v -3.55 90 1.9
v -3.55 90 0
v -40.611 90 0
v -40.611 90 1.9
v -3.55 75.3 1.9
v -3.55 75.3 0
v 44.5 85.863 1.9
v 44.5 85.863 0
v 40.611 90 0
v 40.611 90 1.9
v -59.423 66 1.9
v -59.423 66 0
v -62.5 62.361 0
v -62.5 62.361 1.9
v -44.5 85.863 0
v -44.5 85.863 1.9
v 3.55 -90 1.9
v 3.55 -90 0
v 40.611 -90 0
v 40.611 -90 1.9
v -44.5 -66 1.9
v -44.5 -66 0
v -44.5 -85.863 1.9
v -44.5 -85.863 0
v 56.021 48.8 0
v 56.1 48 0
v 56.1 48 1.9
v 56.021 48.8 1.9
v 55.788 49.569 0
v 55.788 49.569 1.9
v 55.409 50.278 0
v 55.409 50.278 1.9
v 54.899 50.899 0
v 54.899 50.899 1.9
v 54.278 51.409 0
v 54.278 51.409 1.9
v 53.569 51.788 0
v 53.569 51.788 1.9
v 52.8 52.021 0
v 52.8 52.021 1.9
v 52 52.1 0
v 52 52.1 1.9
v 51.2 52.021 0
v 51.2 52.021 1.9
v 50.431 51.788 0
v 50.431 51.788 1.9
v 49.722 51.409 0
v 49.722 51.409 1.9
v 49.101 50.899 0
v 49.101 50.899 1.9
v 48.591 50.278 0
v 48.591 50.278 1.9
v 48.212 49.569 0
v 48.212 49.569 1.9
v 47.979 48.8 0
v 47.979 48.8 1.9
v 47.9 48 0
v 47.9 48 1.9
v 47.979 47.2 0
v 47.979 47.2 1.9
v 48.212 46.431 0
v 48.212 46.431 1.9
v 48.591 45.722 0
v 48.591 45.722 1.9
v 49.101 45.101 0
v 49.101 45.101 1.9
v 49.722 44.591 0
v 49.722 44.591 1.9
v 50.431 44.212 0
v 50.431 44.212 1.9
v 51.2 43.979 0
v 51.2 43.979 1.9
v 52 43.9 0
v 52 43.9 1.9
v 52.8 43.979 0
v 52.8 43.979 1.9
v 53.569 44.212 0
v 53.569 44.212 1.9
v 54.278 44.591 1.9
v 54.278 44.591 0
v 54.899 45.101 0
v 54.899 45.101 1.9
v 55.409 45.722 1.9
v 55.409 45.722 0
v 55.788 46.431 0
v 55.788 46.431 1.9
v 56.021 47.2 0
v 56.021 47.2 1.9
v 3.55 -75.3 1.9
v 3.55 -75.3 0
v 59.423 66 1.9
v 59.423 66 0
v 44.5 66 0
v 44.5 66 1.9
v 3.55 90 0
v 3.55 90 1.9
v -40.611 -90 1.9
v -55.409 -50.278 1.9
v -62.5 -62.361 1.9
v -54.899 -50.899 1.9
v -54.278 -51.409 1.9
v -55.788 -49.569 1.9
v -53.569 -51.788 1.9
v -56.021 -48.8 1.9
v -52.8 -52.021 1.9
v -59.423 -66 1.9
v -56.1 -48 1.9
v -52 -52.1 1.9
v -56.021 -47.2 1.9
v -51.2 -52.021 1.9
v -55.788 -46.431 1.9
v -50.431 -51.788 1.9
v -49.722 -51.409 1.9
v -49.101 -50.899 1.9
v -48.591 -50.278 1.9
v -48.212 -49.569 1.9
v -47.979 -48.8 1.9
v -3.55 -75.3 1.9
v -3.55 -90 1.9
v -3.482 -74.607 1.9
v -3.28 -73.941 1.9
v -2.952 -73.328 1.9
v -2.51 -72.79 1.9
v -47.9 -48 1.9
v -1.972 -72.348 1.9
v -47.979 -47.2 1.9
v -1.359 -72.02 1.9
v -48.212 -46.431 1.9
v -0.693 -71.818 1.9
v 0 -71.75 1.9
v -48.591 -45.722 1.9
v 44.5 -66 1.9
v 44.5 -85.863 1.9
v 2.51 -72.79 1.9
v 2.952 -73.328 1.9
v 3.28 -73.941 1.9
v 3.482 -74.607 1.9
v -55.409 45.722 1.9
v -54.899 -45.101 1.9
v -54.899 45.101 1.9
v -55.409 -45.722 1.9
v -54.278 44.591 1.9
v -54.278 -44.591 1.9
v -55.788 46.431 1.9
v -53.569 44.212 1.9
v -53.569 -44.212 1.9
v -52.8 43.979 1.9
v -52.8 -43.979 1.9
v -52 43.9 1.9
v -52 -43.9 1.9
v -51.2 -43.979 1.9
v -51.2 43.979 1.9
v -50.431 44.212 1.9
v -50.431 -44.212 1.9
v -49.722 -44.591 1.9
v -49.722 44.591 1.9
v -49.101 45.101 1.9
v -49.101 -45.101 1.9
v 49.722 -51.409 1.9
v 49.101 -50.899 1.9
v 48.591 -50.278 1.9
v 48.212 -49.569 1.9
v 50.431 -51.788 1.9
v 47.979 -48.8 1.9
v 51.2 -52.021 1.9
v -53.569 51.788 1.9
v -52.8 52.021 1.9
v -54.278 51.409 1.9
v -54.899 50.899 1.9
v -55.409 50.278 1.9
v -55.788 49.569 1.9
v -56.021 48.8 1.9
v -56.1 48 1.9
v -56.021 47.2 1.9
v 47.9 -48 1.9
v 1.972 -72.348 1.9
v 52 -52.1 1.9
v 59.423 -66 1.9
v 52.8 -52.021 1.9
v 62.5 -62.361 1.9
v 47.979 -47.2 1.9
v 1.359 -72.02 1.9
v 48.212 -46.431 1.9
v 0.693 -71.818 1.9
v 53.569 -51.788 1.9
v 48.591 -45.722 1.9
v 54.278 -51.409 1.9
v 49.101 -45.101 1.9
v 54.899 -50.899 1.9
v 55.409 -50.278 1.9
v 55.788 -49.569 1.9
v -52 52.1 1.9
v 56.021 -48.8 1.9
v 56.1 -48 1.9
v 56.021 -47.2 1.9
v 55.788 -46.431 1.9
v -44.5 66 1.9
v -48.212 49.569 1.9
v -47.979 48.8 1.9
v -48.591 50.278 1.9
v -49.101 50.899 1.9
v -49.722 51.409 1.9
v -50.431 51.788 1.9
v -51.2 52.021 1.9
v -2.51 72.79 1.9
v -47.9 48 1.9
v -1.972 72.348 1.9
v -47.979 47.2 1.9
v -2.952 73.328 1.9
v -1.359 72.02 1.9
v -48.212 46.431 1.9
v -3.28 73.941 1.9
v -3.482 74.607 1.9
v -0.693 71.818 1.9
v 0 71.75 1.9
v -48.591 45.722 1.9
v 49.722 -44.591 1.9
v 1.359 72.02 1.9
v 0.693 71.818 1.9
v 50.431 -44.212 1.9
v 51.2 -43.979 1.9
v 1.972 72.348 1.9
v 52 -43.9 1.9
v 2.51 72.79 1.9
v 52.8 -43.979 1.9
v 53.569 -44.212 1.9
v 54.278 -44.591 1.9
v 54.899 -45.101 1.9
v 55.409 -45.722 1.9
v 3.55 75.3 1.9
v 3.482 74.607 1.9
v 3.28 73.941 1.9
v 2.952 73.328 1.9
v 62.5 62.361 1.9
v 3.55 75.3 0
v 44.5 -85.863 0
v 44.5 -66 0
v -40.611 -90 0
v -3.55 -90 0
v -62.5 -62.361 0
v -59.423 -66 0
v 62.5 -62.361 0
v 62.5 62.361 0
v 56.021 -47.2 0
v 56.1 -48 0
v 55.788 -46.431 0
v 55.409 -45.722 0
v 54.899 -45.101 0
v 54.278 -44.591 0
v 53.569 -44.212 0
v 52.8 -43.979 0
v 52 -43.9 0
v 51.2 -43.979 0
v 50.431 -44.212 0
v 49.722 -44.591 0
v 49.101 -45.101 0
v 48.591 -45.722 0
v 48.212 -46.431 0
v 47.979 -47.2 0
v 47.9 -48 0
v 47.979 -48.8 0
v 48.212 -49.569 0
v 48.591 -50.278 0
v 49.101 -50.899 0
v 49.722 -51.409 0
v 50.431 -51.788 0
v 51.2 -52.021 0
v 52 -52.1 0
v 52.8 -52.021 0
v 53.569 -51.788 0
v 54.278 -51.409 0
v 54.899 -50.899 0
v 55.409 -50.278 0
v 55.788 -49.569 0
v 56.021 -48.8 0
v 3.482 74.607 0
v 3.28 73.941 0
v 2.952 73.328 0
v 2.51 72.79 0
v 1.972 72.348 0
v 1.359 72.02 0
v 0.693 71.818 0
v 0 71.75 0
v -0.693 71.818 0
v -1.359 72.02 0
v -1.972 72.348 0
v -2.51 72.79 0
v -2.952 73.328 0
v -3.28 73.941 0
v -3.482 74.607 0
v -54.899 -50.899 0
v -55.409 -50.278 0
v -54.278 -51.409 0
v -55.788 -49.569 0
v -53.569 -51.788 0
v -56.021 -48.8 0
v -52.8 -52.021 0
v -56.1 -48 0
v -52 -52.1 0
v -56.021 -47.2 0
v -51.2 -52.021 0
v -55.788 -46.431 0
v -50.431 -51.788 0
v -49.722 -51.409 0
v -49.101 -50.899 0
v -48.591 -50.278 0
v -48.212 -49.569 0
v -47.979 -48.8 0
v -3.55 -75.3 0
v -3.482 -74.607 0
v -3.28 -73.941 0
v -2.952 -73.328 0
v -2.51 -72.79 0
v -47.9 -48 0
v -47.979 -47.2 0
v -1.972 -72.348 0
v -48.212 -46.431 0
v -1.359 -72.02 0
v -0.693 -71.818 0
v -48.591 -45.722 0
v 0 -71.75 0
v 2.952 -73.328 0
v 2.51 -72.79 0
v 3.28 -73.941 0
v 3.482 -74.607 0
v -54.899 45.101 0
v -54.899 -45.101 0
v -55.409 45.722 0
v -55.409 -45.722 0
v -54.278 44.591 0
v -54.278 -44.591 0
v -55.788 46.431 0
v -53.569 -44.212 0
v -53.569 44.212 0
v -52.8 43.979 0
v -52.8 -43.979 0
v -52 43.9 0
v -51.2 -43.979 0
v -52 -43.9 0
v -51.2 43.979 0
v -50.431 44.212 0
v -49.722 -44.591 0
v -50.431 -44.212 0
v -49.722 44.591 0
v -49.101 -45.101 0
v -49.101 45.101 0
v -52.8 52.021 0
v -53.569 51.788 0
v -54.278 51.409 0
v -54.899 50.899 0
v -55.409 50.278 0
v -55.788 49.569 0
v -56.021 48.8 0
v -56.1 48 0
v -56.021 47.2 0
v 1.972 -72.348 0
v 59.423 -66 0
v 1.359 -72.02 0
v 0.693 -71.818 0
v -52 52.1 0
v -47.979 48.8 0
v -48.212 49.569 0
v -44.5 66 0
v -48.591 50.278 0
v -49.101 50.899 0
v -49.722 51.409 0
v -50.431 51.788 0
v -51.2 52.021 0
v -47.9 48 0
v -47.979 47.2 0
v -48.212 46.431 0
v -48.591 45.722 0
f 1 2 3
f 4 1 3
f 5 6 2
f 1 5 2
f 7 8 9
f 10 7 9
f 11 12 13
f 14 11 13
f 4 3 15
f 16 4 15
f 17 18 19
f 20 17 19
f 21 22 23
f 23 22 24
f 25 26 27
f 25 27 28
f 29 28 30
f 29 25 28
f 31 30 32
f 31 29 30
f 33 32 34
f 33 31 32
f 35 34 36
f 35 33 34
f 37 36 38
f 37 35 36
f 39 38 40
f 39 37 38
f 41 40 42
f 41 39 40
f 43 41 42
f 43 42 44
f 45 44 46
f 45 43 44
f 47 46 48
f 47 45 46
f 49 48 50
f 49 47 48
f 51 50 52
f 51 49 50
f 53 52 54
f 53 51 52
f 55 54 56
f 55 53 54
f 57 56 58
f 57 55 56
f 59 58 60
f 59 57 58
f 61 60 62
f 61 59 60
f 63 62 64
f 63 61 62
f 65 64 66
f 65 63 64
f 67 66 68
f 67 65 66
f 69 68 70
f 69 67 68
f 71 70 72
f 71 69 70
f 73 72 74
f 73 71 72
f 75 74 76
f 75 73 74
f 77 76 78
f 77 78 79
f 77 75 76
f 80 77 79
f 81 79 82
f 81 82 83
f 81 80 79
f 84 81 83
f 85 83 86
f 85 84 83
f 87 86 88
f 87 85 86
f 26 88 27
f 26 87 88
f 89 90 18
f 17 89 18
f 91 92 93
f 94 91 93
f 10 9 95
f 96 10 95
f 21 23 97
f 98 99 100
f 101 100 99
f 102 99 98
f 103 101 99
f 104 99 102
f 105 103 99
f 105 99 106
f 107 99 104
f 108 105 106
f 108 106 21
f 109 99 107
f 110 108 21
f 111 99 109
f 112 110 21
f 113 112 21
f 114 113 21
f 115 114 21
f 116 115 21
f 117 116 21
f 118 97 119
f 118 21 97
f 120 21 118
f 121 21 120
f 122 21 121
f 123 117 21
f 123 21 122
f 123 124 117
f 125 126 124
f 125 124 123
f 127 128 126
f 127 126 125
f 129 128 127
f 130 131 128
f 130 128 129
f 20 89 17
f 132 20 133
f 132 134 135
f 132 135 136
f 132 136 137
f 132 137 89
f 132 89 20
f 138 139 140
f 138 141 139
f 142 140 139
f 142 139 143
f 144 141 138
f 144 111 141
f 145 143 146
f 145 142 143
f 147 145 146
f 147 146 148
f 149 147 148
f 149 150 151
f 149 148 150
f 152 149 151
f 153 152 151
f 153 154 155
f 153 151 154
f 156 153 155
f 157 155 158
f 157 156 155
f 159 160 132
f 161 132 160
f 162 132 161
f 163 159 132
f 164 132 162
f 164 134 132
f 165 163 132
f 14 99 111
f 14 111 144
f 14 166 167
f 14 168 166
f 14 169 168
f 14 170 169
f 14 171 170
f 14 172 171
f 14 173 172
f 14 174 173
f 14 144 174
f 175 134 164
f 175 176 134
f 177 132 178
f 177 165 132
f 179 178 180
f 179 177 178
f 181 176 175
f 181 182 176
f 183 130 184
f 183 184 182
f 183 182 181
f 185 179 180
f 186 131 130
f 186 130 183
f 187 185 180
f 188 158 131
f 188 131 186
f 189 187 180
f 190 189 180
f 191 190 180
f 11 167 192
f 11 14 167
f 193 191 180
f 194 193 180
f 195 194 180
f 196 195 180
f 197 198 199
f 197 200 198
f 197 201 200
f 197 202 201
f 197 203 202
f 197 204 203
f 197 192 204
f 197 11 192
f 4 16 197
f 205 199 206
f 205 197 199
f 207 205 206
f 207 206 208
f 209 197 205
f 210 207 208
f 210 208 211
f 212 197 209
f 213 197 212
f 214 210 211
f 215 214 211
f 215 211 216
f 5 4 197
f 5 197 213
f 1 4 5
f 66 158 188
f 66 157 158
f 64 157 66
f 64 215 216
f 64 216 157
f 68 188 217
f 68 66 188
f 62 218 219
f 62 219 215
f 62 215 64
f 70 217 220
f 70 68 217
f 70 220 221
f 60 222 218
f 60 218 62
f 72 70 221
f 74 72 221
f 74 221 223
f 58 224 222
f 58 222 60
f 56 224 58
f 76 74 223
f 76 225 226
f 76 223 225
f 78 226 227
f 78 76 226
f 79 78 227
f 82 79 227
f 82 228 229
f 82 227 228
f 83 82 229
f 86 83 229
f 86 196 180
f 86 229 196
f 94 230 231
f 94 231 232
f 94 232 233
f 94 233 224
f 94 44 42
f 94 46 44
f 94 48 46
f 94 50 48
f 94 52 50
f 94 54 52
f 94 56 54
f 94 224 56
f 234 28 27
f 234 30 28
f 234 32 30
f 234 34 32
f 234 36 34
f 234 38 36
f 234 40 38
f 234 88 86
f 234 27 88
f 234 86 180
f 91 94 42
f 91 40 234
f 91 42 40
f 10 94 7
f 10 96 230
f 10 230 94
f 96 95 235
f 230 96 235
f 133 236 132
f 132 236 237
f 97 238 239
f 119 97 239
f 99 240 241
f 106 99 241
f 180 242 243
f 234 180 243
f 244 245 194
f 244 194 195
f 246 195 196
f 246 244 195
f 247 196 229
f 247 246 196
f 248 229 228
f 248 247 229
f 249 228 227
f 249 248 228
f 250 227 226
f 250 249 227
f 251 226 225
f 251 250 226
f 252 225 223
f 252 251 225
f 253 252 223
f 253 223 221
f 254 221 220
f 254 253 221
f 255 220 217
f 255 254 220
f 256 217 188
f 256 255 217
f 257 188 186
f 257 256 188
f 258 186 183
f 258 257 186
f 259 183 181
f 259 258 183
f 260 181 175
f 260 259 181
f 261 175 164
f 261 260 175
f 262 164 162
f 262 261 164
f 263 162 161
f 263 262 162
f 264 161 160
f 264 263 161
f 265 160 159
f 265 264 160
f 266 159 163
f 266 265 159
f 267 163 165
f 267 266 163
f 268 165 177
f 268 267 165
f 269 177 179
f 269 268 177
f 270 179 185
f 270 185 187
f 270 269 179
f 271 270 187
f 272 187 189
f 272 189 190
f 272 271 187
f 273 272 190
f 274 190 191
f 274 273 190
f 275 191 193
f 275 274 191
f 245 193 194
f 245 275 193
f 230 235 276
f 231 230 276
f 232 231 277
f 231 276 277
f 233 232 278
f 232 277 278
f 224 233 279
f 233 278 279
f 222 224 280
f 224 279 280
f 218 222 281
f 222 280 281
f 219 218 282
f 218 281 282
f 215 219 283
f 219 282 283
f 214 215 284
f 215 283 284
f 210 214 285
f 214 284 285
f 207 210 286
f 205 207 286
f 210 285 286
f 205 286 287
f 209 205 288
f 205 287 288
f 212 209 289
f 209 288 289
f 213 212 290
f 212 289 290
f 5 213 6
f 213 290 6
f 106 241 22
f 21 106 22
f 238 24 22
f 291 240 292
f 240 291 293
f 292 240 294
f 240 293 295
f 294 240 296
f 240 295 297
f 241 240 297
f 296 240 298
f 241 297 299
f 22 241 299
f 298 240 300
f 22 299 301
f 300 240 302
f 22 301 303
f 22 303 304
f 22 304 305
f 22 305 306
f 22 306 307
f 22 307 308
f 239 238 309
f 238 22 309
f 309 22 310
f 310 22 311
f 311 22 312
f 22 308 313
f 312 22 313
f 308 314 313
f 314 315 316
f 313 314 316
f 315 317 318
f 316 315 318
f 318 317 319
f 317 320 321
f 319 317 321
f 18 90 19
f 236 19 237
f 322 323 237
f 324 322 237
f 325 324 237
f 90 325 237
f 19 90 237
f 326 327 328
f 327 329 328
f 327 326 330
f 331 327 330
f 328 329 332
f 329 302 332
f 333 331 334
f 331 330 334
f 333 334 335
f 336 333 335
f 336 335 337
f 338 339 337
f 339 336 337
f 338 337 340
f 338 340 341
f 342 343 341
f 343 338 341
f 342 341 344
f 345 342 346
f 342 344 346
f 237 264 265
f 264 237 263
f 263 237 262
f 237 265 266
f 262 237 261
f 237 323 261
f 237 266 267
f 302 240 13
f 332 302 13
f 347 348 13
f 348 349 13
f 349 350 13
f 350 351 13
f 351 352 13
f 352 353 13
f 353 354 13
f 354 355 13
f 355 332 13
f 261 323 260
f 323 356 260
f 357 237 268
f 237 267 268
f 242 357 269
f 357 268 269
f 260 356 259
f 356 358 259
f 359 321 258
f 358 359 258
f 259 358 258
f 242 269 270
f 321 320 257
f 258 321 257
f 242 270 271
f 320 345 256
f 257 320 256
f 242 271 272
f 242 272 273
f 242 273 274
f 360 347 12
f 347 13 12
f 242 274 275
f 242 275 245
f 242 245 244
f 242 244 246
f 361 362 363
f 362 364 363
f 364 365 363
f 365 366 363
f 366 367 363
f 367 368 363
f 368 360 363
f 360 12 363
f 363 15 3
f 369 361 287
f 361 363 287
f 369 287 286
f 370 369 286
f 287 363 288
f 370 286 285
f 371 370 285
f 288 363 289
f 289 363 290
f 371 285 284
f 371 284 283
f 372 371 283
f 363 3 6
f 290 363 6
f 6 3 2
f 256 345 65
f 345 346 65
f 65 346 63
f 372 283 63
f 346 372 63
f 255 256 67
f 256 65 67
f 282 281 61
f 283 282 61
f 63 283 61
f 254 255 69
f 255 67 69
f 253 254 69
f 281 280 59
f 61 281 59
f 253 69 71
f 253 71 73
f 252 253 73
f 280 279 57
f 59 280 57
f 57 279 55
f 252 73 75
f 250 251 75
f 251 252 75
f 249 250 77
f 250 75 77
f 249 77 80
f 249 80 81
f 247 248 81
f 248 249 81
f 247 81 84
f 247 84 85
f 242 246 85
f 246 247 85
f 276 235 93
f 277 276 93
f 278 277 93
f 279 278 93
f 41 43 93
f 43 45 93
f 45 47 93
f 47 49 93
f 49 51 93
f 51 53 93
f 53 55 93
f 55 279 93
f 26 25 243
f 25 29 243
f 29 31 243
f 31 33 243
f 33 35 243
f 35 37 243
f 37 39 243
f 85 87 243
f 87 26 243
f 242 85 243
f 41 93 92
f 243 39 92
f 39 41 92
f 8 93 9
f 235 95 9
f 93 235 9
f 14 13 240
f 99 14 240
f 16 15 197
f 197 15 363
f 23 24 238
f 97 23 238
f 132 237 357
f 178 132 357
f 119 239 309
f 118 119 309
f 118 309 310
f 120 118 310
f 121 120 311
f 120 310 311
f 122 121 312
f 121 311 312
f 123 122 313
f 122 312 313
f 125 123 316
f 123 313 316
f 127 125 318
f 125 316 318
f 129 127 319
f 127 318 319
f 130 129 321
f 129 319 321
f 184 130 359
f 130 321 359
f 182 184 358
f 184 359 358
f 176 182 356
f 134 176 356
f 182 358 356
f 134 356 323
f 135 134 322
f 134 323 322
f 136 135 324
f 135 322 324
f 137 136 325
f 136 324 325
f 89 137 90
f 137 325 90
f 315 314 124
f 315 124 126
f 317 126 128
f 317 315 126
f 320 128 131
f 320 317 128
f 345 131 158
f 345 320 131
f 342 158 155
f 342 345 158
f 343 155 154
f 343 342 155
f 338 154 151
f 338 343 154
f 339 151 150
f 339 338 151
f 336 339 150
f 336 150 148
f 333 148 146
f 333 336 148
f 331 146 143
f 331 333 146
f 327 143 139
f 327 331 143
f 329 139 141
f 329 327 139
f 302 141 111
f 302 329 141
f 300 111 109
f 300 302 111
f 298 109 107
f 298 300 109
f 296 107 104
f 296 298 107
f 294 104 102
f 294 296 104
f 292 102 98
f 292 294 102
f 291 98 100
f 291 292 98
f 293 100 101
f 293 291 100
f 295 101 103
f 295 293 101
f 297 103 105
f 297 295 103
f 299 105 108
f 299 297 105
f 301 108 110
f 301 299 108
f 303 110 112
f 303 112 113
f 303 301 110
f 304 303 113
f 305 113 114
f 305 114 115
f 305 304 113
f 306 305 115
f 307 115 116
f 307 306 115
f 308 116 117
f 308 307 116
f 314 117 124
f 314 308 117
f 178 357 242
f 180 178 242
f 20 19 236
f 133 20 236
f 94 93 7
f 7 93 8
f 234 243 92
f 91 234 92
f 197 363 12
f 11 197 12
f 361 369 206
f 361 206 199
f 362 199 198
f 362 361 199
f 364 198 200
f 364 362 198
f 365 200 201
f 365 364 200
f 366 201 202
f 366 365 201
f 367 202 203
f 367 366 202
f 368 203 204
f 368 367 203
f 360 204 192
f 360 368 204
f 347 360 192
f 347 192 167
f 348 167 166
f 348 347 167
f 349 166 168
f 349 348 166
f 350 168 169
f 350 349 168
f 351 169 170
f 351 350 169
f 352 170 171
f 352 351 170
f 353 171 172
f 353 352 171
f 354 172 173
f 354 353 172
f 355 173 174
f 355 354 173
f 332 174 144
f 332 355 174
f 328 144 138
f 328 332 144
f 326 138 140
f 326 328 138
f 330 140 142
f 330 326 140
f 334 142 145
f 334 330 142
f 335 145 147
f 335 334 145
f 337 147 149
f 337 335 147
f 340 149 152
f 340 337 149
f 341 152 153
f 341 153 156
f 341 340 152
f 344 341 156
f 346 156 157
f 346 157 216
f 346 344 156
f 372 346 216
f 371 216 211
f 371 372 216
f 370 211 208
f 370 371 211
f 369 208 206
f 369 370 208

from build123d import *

# Parameters (mm, degrees)
F0_R     = 4.1
F1_DEPTH = 1.9


with BuildPart() as f1:
    # F0 (on Top) → F1 (new body)
    with BuildSketch(Plane.XY):
        with BuildLine():
            Line((3.55, -90), (40.611275, -90))
            Line((40.611275, -90), (44.5, -85.863031))
            Line((44.5, -85.863031), (44.5, -66))
            Line((44.5, -66), (59.422746, -66))
            Line((59.422746, -66), (62.5, -62.361009))
            Line((62.5, -62.361009), (62.5, 62.361009))
            Line((62.5, 62.361009), (59.422746, 66))
            Line((59.422746, 66), (44.5, 66))
            Line((44.5, 66), (44.5, 85.863031))
            Line((44.5, 85.863031), (40.611275, 90))
            Line((40.611275, 90), (3.55, 90))
            Line((3.55, 90), (3.55, 75.3))
            ThreePointArc((3.55, 75.3), (0, 71.75), (-3.55, 75.3))
            Line((-3.55, 75.3), (-3.55, 90))
            Line((-3.55, 90), (-40.611275, 90))
            Line((-40.611275, 90), (-44.5, 85.863031))
            Line((-44.5, 85.863031), (-44.5, 66))
            Line((-44.5, 66), (-59.422746, 66))
            Line((-59.422746, 66), (-62.5, 62.361009))
            Line((-62.5, 62.361009), (-62.5, -62.361009))
            Line((-62.5, -62.361009), (-59.422746, -66))
            Line((-59.422746, -66), (-44.5, -66))
            Line((-44.5, -66), (-44.5, -85.863031))
            Line((-44.5, -85.863031), (-40.611275, -90))
            Line((-40.611275, -90), (-3.55, -90))
            Line((-3.55, -90), (-3.55, -75.3))
            ThreePointArc((-3.55, -75.3), (0, -71.75), (3.55, -75.3))
            Line((3.55, -75.3), (3.55, -90))
        make_face()
        with Locations((-52, -48)):
            Circle(F0_R, mode=Mode.SUBTRACT)
        with Locations((52, -48)):
            Circle(F0_R, mode=Mode.SUBTRACT)
        with Locations((-52, 48)):
            Circle(F0_R, mode=Mode.SUBTRACT)
        with Locations((52, 48)):
            Circle(F0_R, mode=Mode.SUBTRACT)
    extrude(amount=F1_DEPTH)


solid = f1.part
